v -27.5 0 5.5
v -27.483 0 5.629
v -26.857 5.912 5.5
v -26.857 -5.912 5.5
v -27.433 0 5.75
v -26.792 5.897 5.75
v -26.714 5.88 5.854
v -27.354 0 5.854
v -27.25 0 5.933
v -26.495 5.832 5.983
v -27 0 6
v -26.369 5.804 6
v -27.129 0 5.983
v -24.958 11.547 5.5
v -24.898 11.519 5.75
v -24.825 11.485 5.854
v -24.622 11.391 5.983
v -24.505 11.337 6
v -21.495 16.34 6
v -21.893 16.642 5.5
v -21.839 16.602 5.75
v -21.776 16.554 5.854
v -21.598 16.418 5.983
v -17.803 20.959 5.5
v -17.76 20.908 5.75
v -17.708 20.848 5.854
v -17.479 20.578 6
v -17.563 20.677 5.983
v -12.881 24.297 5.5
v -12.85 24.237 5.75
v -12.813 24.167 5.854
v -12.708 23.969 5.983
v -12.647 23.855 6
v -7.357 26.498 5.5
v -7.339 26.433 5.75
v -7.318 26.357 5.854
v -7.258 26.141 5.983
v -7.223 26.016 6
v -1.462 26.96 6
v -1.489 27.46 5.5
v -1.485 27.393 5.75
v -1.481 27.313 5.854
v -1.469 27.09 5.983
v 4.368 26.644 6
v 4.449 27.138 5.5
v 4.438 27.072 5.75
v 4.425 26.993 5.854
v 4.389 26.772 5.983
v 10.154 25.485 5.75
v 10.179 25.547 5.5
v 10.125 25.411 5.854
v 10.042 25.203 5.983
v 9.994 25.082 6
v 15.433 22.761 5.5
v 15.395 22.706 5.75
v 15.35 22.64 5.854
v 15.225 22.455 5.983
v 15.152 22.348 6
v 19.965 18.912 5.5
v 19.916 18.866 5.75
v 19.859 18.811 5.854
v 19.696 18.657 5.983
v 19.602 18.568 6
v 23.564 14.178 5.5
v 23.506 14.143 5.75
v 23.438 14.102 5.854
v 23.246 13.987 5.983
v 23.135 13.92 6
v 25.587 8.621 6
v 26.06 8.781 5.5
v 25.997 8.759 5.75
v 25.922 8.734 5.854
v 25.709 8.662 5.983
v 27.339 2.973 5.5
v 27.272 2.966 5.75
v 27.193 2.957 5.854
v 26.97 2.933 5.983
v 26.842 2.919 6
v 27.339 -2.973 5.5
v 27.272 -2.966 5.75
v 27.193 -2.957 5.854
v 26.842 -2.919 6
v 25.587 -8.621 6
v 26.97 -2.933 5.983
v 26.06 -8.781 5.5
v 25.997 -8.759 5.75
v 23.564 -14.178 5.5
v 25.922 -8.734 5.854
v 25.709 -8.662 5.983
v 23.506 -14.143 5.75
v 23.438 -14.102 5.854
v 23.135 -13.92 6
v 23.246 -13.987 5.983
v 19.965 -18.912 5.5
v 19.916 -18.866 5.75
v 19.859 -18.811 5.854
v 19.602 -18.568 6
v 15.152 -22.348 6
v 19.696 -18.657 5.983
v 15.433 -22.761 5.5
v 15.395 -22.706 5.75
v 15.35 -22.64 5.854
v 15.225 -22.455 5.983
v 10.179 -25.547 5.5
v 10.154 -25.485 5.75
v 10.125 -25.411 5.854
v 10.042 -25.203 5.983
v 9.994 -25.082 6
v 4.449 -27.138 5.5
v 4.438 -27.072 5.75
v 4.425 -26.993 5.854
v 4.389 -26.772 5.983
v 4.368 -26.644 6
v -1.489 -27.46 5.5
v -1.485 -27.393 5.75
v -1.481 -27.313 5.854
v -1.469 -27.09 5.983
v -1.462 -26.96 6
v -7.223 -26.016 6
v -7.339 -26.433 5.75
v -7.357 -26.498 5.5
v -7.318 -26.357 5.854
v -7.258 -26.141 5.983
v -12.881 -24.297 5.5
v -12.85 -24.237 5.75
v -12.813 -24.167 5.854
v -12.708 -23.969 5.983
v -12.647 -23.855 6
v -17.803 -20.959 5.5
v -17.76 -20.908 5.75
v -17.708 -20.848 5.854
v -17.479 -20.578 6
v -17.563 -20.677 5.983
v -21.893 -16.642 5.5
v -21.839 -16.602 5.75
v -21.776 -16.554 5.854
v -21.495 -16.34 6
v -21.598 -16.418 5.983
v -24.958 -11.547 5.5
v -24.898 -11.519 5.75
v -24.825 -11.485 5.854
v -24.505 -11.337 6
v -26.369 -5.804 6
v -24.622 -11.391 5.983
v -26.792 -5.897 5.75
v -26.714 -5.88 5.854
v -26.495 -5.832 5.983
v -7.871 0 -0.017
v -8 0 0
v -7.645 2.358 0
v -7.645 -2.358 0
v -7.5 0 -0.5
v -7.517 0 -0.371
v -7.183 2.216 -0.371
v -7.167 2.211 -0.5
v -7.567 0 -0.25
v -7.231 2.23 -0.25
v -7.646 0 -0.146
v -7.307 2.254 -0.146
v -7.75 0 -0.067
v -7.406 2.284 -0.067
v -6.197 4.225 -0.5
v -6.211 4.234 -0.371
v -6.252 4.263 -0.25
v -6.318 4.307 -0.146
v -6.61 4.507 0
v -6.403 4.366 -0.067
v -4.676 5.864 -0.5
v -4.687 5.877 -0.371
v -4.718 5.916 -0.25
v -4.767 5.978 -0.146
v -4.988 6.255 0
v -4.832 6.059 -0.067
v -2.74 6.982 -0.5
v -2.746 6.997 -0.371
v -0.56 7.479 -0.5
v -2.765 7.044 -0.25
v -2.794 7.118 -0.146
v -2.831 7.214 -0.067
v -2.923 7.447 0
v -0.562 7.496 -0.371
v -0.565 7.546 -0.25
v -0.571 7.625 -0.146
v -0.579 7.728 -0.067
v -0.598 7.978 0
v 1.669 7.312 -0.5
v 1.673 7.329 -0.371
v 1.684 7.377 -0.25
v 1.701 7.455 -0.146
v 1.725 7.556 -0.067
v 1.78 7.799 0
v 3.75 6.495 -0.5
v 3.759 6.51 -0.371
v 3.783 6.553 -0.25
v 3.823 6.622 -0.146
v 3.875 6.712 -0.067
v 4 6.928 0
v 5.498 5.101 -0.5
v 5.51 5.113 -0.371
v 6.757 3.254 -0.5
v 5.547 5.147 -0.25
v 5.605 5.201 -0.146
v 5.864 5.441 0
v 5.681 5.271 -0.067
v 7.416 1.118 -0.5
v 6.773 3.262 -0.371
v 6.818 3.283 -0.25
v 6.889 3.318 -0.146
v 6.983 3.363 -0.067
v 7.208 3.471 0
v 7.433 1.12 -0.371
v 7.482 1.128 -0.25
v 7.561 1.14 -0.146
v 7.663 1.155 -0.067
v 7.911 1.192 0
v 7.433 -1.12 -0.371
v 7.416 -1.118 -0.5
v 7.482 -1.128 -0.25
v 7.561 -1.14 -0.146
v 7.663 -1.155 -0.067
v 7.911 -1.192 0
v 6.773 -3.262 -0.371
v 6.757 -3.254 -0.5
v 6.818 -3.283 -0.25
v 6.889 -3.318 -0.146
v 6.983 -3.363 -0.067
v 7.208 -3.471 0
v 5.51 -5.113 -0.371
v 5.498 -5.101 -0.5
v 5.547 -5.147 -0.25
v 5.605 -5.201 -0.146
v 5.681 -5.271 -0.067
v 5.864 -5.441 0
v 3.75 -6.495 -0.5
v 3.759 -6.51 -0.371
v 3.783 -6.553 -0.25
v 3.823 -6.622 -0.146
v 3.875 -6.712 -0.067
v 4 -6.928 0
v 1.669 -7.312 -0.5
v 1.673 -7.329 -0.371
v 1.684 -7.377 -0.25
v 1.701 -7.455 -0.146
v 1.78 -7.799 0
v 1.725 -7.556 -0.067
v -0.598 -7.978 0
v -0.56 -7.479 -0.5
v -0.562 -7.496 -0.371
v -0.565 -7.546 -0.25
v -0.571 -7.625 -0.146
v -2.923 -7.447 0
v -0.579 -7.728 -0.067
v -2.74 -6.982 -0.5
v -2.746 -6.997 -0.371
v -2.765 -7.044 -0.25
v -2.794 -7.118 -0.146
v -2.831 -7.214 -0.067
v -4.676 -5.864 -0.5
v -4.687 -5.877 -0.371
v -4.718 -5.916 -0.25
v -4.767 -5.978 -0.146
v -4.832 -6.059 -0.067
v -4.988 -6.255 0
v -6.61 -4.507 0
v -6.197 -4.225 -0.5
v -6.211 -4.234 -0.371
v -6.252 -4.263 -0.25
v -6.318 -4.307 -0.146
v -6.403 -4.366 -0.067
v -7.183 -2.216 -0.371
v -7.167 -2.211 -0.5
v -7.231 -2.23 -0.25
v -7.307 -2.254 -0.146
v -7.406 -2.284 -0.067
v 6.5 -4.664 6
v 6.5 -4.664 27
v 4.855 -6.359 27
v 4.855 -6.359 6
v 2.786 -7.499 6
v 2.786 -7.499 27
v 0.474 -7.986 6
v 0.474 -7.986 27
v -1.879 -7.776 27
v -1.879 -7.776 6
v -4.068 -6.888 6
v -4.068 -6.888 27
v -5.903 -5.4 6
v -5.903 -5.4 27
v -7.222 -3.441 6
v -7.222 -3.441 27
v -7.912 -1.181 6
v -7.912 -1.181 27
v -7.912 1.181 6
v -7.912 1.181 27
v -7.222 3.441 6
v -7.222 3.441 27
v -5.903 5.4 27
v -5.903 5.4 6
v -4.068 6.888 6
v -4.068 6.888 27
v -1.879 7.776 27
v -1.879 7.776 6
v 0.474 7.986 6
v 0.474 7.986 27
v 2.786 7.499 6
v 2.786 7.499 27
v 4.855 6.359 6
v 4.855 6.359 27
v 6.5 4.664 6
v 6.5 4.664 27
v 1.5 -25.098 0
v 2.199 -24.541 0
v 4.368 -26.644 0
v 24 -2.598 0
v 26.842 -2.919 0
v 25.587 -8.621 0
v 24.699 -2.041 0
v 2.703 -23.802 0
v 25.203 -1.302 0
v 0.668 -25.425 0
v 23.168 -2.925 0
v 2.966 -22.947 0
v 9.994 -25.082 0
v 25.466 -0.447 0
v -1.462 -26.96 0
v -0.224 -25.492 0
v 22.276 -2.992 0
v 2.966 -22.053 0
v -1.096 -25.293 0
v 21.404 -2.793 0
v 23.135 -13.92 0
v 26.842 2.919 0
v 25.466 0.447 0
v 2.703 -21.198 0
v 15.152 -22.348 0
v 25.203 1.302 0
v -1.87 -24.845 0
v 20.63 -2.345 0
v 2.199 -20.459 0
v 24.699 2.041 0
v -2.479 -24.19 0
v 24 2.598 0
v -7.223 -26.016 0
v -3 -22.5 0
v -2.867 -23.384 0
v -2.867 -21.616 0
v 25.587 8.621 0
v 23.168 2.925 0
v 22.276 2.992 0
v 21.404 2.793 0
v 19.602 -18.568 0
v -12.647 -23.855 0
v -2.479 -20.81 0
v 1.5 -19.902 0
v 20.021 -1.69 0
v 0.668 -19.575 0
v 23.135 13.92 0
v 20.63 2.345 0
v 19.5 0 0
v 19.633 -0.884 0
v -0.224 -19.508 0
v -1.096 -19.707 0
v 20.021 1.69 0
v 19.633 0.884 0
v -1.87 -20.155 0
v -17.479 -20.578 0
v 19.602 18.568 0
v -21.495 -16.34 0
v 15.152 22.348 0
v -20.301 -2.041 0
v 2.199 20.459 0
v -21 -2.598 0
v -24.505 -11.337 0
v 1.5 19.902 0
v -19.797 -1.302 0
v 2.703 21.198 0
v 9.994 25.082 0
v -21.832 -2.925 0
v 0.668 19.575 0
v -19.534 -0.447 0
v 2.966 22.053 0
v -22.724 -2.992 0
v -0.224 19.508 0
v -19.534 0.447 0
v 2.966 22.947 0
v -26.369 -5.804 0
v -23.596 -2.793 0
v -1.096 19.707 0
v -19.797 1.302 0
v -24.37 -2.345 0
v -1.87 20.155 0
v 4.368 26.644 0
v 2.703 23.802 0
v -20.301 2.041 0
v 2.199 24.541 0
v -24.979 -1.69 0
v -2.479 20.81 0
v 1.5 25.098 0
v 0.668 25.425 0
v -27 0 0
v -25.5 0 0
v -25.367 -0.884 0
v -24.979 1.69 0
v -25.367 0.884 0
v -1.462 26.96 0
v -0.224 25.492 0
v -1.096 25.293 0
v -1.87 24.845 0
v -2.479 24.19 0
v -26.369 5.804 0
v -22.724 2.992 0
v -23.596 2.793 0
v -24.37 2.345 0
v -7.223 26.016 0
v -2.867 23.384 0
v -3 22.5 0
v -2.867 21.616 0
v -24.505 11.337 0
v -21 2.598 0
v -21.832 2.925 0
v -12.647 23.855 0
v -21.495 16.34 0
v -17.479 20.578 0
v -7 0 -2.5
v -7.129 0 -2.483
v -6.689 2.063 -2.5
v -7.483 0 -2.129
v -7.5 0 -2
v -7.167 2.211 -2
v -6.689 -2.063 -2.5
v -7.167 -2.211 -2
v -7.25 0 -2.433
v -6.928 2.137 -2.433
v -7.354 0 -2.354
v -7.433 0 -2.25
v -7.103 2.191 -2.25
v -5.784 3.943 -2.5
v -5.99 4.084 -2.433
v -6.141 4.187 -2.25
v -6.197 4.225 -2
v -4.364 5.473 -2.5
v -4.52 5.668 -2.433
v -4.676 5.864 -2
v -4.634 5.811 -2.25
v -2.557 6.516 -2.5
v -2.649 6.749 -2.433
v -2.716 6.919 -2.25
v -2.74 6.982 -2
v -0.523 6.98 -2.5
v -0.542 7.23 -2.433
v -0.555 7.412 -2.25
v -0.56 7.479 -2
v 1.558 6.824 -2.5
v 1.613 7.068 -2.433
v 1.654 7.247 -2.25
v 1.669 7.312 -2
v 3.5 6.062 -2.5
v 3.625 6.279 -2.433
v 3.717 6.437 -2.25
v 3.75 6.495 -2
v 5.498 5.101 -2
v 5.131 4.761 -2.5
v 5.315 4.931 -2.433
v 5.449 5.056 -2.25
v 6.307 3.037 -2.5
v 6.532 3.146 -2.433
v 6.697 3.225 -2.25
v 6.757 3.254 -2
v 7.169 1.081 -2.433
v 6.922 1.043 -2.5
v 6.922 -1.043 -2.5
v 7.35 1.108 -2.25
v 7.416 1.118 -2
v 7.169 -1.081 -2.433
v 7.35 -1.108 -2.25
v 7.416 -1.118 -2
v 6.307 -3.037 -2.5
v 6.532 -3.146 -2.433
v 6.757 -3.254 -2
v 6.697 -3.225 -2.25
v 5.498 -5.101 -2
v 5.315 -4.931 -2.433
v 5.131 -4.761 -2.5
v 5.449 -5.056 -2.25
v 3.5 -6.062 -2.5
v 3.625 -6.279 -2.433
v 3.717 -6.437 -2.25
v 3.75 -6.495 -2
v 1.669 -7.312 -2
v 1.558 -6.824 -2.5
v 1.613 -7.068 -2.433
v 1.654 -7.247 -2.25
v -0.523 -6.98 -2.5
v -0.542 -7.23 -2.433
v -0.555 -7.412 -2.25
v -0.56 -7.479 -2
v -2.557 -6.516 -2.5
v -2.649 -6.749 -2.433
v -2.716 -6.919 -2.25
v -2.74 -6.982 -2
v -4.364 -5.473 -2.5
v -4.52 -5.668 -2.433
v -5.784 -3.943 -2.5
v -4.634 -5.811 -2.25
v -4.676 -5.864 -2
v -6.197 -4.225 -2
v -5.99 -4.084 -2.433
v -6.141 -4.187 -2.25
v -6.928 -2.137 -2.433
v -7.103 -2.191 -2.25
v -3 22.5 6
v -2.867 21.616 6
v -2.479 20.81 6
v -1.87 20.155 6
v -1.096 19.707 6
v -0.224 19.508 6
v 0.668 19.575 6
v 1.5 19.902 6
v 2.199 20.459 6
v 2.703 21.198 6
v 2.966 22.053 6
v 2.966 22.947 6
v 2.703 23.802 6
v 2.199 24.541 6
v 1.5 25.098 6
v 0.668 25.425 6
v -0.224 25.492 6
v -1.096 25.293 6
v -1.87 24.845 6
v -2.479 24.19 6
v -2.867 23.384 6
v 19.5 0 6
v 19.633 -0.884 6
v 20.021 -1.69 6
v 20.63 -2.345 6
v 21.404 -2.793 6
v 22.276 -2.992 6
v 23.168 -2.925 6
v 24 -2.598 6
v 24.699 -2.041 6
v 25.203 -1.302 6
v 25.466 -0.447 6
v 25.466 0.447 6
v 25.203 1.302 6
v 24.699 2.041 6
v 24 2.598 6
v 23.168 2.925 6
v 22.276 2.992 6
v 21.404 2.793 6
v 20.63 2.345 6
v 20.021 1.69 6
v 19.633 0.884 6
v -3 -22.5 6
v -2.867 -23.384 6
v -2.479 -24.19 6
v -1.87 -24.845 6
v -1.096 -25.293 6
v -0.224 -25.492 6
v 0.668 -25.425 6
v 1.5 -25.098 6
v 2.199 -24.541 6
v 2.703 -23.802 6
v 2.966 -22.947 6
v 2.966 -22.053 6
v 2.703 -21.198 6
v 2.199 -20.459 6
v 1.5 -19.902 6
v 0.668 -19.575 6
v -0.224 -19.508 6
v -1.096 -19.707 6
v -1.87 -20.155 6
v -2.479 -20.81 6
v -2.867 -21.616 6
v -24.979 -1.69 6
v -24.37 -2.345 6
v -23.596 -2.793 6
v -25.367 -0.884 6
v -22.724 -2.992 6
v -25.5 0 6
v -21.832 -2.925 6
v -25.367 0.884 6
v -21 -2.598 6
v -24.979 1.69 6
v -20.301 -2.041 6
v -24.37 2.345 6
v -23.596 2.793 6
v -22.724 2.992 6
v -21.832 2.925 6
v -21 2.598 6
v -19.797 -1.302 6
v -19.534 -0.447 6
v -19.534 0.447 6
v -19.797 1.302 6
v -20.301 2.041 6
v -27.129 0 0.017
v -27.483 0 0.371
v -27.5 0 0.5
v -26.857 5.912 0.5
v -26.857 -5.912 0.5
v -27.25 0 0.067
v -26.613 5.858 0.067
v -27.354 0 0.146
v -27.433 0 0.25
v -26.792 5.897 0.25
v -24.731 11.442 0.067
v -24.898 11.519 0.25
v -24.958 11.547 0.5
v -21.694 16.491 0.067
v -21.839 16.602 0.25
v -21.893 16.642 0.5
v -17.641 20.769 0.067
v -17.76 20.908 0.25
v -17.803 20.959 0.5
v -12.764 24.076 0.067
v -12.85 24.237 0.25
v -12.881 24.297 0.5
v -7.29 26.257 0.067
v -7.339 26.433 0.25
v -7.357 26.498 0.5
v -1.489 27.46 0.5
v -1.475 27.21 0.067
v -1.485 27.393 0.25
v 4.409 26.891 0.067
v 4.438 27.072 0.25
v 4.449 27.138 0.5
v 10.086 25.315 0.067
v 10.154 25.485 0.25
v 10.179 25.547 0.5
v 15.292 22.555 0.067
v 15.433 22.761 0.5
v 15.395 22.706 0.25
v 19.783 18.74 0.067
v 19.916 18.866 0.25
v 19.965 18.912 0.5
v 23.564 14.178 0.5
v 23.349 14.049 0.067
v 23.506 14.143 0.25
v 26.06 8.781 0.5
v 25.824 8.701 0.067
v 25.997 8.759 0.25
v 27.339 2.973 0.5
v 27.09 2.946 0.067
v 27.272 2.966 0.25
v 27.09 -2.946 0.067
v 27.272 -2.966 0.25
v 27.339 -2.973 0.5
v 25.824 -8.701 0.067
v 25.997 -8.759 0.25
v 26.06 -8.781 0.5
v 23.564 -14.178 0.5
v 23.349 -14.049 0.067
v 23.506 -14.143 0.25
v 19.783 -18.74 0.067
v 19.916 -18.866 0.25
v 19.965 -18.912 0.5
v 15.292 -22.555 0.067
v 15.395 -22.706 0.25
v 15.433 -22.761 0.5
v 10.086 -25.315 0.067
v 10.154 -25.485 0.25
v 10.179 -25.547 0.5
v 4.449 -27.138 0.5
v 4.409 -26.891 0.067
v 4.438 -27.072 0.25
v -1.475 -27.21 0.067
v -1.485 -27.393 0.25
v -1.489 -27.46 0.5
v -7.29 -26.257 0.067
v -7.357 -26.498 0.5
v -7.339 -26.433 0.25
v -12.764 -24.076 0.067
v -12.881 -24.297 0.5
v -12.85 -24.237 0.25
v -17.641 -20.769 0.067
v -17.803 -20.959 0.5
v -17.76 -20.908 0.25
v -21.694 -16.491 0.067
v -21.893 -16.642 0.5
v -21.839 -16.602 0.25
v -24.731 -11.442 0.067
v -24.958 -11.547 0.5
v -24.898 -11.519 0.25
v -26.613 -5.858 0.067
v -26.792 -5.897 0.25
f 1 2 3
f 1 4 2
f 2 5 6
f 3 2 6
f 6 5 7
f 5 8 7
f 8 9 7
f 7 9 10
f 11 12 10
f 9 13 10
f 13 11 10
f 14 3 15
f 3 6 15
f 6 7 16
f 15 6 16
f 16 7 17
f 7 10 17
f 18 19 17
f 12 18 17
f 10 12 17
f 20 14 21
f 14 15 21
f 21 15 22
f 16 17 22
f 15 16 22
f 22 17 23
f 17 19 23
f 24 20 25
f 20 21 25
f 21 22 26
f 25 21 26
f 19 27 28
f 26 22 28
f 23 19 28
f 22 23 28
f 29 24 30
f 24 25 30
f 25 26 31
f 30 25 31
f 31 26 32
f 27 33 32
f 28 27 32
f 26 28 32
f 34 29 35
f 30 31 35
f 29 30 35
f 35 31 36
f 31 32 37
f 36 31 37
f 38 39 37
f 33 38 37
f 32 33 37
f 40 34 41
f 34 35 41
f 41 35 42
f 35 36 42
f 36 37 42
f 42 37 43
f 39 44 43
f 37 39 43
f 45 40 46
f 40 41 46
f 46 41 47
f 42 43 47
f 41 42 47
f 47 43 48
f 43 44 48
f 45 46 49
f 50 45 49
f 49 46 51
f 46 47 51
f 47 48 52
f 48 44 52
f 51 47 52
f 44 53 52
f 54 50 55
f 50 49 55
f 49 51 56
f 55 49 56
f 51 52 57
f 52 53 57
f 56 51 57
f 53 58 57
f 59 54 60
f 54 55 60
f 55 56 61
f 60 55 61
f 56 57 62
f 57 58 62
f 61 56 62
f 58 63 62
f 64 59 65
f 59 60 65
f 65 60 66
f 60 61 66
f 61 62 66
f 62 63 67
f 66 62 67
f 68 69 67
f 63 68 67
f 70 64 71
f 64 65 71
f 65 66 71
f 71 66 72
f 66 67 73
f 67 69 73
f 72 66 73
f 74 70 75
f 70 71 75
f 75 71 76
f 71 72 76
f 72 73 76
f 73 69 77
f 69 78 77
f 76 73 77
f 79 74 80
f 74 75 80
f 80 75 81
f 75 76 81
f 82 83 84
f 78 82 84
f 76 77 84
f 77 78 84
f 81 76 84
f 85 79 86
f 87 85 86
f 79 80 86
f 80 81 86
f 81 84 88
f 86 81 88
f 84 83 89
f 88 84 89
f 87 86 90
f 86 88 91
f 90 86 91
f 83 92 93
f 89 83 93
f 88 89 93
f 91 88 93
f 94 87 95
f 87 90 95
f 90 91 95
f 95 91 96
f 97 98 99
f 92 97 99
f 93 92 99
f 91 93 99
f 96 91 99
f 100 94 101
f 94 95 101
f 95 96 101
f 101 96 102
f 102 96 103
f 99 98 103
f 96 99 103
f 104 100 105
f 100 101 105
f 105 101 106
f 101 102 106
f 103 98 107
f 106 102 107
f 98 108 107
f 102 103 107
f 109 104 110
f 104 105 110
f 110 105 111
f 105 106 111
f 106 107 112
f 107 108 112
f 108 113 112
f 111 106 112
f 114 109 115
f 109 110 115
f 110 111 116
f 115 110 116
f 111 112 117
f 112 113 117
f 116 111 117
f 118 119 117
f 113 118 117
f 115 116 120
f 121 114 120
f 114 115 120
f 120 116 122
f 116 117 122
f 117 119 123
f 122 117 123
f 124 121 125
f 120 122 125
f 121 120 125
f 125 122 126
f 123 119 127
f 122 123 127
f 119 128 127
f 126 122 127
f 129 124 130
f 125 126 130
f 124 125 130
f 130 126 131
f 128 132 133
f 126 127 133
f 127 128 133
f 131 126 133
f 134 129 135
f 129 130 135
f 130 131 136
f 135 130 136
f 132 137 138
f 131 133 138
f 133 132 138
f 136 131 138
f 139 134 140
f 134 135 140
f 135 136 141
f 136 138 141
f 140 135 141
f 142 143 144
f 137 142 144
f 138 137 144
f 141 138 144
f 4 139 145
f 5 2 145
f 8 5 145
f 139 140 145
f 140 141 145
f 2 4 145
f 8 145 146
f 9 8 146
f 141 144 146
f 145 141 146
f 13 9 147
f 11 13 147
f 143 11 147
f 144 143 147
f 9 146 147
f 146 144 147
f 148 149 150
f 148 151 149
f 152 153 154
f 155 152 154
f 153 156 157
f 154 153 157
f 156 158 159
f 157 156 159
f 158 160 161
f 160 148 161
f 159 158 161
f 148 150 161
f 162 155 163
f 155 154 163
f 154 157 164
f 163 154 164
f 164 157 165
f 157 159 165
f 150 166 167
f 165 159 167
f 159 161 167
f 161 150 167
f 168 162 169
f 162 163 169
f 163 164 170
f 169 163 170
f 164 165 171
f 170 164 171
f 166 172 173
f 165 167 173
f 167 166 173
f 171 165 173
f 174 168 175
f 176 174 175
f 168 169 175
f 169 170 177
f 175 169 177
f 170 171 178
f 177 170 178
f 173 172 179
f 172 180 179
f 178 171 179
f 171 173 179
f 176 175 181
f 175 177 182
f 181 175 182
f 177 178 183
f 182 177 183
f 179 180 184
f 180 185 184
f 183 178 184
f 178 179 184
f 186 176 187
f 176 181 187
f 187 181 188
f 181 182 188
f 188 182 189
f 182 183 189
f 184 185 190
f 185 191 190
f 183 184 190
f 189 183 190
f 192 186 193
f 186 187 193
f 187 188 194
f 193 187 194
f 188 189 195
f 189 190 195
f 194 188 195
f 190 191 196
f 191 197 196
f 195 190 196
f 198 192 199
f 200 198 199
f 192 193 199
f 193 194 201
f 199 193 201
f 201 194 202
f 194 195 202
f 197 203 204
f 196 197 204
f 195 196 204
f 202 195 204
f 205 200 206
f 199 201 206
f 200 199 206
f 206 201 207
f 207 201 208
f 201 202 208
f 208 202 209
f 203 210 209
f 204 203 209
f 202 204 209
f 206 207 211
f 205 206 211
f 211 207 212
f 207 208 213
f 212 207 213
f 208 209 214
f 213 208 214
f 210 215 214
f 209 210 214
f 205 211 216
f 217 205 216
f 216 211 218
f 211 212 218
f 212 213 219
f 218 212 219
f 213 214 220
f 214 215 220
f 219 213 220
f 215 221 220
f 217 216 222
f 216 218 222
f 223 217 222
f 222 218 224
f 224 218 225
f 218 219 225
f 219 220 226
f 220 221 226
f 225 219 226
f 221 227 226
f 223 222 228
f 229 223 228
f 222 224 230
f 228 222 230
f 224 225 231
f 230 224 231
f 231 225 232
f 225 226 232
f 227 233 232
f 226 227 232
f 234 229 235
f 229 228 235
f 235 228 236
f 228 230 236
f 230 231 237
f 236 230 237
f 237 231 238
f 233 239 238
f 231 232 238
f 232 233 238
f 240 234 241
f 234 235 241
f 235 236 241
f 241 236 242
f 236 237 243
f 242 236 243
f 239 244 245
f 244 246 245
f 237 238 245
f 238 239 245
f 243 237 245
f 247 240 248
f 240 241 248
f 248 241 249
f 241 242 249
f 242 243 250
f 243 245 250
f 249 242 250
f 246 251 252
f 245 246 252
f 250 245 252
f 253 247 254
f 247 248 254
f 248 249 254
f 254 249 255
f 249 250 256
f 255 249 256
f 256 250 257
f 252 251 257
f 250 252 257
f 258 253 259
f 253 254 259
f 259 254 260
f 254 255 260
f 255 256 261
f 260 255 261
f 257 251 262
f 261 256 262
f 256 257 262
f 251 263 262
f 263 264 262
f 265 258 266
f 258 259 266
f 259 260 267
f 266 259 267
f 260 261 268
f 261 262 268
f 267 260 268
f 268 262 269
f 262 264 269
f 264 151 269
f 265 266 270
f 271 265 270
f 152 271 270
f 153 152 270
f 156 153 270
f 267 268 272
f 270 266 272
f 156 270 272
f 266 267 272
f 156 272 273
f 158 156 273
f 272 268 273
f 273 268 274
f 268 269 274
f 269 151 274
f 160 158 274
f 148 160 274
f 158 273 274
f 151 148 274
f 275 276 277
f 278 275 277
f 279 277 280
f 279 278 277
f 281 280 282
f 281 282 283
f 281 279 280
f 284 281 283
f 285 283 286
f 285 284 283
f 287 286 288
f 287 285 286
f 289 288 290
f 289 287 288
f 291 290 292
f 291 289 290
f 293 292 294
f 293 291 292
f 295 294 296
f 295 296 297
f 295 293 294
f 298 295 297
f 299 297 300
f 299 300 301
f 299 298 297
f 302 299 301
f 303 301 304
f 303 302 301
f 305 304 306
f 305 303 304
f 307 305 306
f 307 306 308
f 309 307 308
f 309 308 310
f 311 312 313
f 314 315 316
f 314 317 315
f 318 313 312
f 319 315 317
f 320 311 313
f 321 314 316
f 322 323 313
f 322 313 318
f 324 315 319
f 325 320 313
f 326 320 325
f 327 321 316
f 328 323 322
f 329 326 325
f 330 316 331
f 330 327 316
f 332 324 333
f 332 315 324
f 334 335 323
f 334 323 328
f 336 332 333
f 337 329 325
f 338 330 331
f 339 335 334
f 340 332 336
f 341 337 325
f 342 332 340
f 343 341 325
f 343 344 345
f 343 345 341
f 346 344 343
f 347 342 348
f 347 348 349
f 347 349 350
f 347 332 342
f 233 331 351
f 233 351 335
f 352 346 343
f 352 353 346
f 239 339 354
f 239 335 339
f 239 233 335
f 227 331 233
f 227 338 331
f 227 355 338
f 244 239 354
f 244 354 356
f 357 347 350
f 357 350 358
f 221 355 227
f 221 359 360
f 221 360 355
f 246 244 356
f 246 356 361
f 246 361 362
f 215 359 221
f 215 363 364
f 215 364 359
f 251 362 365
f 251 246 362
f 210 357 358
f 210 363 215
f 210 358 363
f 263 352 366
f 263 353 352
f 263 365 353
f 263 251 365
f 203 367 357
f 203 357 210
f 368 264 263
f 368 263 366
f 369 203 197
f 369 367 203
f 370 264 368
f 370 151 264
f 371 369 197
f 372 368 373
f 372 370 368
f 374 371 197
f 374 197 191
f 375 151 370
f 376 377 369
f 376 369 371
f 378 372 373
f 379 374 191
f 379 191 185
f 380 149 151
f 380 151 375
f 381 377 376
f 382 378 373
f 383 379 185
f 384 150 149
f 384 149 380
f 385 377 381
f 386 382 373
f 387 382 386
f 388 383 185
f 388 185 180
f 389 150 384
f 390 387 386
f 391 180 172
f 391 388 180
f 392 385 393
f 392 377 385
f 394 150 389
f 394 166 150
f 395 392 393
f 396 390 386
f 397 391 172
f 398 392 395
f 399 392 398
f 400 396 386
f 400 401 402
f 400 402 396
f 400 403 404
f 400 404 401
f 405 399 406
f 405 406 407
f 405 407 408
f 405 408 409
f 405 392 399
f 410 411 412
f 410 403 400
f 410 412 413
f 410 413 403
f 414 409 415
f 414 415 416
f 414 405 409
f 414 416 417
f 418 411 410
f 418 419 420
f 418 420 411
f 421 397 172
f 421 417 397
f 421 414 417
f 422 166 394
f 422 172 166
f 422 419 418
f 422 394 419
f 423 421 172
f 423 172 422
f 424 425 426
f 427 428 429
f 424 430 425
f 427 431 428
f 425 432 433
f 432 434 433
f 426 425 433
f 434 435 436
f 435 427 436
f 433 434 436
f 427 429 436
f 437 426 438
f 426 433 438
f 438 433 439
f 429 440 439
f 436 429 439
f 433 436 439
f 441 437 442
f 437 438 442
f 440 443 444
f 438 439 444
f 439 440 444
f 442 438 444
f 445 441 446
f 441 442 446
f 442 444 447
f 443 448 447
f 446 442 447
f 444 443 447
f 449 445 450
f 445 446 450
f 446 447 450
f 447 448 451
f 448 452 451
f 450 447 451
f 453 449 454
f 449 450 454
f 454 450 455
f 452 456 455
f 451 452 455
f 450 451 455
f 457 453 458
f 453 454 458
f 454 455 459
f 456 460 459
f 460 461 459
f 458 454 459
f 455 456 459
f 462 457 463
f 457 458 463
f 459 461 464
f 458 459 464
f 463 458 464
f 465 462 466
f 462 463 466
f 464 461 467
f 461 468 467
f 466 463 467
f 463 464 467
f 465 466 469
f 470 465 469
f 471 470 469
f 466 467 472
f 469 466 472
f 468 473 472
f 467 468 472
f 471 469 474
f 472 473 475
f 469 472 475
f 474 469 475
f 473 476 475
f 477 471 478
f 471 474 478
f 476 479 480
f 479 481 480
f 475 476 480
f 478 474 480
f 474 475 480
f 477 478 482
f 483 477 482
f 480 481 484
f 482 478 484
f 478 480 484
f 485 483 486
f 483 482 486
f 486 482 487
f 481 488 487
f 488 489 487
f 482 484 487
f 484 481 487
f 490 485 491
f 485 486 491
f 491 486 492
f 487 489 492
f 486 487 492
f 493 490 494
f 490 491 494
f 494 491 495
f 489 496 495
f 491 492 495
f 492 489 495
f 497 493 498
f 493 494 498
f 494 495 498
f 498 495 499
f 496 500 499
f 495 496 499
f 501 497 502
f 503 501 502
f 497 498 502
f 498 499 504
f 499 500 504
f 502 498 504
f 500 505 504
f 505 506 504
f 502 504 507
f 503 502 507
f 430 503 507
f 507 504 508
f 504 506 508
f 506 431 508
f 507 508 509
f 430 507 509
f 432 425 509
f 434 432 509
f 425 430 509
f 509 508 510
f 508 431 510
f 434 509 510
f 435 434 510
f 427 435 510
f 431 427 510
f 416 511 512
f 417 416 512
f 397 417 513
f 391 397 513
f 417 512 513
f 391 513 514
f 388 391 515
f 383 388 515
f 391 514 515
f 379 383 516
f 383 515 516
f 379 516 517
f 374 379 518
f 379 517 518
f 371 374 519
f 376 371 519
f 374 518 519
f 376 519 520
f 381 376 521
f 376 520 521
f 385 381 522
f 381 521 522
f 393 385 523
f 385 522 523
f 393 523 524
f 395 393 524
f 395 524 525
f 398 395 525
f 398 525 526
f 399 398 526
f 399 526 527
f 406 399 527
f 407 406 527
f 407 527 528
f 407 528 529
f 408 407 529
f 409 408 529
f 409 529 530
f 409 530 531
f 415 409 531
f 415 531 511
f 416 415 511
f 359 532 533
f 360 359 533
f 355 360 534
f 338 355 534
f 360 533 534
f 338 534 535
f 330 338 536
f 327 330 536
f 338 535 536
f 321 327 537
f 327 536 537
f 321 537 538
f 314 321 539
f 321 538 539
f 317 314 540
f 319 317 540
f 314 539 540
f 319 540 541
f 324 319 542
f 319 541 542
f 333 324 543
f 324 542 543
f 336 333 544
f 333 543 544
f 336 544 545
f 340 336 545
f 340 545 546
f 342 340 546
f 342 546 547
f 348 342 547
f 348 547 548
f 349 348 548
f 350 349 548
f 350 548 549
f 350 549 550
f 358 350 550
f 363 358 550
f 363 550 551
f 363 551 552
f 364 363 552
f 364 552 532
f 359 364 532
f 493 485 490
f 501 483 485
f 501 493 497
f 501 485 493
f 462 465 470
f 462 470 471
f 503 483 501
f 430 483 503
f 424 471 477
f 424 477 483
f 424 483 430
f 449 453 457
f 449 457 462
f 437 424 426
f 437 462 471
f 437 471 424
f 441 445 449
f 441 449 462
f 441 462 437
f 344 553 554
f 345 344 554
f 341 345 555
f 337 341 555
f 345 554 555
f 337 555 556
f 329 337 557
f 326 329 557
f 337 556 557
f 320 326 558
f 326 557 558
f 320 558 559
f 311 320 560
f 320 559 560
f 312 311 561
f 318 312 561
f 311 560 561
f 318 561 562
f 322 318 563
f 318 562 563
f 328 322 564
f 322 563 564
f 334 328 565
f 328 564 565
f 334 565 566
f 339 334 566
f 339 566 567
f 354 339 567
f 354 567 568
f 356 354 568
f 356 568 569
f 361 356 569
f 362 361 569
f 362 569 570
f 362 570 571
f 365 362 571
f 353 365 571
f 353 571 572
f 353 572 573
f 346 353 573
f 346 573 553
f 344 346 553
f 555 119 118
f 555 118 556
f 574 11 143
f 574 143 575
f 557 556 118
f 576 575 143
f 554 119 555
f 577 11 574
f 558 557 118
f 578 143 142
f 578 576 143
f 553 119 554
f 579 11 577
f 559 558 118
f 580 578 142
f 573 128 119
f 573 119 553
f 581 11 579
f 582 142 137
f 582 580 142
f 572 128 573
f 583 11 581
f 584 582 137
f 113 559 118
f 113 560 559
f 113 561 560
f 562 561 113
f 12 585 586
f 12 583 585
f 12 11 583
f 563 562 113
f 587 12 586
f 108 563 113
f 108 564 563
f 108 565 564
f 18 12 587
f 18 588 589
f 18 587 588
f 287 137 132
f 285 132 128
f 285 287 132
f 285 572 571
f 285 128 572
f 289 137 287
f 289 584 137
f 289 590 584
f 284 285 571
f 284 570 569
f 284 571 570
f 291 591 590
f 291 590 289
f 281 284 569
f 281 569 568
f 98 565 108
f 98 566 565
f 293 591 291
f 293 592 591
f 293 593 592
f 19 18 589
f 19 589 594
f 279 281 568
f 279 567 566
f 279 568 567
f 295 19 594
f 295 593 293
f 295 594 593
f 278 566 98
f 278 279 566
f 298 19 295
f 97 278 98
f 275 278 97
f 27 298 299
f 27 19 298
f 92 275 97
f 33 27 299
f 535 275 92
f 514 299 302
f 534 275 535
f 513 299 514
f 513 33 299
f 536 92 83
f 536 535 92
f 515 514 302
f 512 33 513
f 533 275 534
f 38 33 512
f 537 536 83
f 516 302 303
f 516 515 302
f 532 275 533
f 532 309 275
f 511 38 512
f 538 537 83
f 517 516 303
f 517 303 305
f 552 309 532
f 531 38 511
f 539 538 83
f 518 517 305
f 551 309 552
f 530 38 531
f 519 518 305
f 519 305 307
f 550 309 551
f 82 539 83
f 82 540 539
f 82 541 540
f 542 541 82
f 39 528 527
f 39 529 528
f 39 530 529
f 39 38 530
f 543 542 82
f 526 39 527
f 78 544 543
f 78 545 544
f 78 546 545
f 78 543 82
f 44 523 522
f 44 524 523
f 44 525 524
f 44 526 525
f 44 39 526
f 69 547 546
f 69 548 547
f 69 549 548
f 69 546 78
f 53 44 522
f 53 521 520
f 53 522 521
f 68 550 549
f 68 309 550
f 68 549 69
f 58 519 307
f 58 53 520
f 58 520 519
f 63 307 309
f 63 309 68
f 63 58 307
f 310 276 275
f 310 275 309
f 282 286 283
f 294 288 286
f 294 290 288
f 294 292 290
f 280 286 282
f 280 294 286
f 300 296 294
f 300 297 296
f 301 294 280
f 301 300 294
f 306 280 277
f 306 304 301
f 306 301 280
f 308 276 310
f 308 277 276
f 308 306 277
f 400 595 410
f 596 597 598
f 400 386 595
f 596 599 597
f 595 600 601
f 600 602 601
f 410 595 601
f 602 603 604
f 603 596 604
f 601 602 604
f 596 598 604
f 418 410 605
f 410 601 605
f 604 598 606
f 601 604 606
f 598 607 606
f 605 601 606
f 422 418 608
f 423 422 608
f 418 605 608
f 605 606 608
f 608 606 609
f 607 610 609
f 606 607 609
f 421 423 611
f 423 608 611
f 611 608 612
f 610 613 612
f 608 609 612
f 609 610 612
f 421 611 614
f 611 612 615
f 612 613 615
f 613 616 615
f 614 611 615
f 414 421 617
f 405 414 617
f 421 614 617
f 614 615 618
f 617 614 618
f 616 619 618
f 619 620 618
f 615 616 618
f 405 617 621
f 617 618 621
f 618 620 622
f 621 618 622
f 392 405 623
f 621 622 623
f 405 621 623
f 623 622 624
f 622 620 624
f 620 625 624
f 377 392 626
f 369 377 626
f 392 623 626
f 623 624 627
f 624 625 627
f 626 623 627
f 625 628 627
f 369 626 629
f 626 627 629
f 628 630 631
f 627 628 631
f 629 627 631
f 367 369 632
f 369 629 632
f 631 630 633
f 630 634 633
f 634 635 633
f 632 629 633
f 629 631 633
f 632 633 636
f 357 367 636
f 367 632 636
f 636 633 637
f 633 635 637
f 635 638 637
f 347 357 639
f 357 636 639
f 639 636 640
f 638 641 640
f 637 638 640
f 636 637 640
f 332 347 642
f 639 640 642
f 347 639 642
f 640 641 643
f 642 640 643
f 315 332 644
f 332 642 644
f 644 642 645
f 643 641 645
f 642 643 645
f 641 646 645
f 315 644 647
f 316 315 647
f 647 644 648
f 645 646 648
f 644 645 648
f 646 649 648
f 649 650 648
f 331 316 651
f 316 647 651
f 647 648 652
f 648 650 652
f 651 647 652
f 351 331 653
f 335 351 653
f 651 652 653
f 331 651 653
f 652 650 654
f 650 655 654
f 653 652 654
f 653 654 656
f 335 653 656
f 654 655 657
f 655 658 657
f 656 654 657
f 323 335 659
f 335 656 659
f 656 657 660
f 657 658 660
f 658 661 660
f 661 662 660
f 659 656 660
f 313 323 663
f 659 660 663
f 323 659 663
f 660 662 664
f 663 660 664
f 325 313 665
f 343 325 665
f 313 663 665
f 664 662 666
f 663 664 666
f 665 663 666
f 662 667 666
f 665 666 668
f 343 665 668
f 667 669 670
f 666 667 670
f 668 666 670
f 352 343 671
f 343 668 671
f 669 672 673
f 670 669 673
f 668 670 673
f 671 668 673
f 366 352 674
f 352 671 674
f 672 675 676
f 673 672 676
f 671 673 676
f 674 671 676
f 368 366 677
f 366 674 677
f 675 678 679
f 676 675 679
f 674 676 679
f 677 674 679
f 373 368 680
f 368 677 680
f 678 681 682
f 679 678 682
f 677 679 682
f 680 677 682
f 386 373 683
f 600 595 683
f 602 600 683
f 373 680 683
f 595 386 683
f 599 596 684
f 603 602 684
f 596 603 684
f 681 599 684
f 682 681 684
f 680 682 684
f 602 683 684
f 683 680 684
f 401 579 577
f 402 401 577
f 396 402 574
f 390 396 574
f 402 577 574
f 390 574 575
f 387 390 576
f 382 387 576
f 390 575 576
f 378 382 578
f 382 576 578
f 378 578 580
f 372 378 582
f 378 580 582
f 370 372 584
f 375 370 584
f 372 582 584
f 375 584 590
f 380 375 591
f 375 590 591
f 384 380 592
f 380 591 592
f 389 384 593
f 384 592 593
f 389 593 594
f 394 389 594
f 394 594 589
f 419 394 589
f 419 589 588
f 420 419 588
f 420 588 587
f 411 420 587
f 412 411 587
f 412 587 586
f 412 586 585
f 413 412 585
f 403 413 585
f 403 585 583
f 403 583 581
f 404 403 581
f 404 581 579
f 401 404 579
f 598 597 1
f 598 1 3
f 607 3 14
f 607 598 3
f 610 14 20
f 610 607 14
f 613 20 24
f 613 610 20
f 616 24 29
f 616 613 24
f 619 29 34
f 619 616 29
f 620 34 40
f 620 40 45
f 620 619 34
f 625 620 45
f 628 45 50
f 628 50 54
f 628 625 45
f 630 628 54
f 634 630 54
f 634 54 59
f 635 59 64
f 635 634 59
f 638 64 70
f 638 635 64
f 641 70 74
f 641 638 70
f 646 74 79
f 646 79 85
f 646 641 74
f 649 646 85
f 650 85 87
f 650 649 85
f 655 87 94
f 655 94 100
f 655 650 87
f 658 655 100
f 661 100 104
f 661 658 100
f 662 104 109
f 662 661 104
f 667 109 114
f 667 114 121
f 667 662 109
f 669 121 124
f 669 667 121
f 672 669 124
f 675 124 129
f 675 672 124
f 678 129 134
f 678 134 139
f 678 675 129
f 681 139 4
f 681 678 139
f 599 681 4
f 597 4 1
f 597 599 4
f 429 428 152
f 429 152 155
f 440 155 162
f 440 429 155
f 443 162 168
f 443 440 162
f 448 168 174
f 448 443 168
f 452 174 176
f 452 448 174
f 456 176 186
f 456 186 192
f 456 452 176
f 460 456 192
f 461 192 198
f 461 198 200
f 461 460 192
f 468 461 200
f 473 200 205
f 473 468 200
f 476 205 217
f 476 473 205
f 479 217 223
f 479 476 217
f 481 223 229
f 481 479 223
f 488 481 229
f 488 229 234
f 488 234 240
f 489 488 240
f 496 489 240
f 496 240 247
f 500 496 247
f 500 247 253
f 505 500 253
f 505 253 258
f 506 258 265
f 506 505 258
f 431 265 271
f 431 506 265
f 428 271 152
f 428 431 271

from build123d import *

# Parameters (mm, degrees)
F3_D     = 6
F4_R     = 0.5
F6_W     = 9.32738
F6_H     = 21
F7_DEPTH = 25


with BuildPart() as f1:
    # F0 (on Front) → F1 (revolve)
    with BuildSketch(Plane.XZ):
        Polygon((-7.5, -2.5), (0, -2.5), (0, 27), (-8, 27), (-8, 6), (-27.5, 6), (-27.5, 0), (-7.5, 0), align=None)
    revolve(axis=Axis((0, 0, 5.601703), (0, 0, -1)))

    # F3 (through all)
    with Locations(Plane(origin=(0, 0, 0), x_dir=(1, 0, 0), z_dir=(0, 0, -1))):
        with Locations((0, -22.5), (22.5, 0), (0, 22.5), (-22.5, 0)):
            Hole(F3_D / 2)

    # F4
    f4_edges = [f1.edges().sort_by_distance(p)[0] for p in [
        (27.5, 0, 6),
        (27.5, 0, 0),
        (7.5, 0, -2.5),
        (7.5, 0, 0),
    ]]
    fillet(f4_edges, radius=F4_R)

    # F6 (on offset) → F7 (cut)
    with BuildSketch(Plane.YZ.offset(6.5)):
        with Locations((0, 16.5)):
            Rectangle(F6_W, F6_H)
    extrude(amount=F7_DEPTH, mode=Mode.SUBTRACT)


solid = f1.part
